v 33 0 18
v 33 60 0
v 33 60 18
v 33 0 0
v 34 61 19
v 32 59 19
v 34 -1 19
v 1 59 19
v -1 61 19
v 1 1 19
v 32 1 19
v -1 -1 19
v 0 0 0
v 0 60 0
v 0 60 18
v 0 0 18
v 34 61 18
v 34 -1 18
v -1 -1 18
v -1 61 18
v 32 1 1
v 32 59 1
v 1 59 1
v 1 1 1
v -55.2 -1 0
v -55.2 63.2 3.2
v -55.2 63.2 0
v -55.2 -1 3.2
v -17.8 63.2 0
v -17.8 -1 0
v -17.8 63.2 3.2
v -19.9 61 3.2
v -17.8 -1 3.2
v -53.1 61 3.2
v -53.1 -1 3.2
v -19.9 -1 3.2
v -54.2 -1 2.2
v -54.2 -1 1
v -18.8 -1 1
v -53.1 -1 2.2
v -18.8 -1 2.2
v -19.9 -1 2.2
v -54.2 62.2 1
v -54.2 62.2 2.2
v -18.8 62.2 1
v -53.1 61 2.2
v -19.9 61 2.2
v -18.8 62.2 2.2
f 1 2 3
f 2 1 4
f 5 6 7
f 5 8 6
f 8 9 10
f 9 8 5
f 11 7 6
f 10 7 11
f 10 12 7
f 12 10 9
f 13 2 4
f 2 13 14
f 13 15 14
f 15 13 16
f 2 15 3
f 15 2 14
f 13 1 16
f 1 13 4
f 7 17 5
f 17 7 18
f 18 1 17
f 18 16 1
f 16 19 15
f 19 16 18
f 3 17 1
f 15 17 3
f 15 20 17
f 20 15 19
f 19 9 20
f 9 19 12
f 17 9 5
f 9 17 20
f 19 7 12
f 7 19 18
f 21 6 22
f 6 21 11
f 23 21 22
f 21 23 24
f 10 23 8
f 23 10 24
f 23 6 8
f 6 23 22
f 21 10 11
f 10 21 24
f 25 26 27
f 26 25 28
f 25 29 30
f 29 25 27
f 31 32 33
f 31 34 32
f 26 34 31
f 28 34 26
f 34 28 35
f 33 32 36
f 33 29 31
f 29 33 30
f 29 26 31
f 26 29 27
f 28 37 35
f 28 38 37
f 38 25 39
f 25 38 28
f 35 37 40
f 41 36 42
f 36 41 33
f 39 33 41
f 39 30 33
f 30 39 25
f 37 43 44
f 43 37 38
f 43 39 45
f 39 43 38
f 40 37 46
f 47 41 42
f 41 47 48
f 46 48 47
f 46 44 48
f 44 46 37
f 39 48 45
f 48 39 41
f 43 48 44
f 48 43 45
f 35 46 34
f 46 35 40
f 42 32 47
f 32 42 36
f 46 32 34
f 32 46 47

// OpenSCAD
// Universal Box by Paxy

/*Customizer Variables*/
height=31;//[5:1:100]
width=58;//[5:1:100]
depth=18;//[5:1:100]
wall=1;//[0.5:0.2:5]
tollerance=1.2;//[0.5:0.2:5]

//redner box
render()base();

//reder cap
//try how it close the base
//translate([0,-wall,depth-wall]) render() cover(); 
translate([-20,0,2*wall+wall*tollerance]) rotate([180,0,180]) render() cover();

/* modules */

module base()
{
difference()
{
   union()
    {
        cube([height+2*wall,width+2*wall,depth+wall]);
        translate([-wall,-wall,depth]) cube([height+4*wall,width+4*wall,wall]);
    }    
    translate([wall,wall,wall])cube([height,width,depth]);
    
    // place for holes
    
    
}
}

module cover(){
    difference()
    {
        translate([-wall*tollerance-wall,-wall,0]) cube([height+4*wall+2*tollerance*wall,width+5*wall+tollerance*wall,2*wall+wall*tollerance]);
        translate([-wall*tollerance,-wall,wall]) cube([height+2*wall+2*tollerance*wall,width+4*wall+tollerance*wall,tollerance*wall]);
        
        translate([-(tollerance-wall)/2,-wall,0]) cube([height+wall+wall*tollerance,width+4*wall,wall]);
    }
    
}
